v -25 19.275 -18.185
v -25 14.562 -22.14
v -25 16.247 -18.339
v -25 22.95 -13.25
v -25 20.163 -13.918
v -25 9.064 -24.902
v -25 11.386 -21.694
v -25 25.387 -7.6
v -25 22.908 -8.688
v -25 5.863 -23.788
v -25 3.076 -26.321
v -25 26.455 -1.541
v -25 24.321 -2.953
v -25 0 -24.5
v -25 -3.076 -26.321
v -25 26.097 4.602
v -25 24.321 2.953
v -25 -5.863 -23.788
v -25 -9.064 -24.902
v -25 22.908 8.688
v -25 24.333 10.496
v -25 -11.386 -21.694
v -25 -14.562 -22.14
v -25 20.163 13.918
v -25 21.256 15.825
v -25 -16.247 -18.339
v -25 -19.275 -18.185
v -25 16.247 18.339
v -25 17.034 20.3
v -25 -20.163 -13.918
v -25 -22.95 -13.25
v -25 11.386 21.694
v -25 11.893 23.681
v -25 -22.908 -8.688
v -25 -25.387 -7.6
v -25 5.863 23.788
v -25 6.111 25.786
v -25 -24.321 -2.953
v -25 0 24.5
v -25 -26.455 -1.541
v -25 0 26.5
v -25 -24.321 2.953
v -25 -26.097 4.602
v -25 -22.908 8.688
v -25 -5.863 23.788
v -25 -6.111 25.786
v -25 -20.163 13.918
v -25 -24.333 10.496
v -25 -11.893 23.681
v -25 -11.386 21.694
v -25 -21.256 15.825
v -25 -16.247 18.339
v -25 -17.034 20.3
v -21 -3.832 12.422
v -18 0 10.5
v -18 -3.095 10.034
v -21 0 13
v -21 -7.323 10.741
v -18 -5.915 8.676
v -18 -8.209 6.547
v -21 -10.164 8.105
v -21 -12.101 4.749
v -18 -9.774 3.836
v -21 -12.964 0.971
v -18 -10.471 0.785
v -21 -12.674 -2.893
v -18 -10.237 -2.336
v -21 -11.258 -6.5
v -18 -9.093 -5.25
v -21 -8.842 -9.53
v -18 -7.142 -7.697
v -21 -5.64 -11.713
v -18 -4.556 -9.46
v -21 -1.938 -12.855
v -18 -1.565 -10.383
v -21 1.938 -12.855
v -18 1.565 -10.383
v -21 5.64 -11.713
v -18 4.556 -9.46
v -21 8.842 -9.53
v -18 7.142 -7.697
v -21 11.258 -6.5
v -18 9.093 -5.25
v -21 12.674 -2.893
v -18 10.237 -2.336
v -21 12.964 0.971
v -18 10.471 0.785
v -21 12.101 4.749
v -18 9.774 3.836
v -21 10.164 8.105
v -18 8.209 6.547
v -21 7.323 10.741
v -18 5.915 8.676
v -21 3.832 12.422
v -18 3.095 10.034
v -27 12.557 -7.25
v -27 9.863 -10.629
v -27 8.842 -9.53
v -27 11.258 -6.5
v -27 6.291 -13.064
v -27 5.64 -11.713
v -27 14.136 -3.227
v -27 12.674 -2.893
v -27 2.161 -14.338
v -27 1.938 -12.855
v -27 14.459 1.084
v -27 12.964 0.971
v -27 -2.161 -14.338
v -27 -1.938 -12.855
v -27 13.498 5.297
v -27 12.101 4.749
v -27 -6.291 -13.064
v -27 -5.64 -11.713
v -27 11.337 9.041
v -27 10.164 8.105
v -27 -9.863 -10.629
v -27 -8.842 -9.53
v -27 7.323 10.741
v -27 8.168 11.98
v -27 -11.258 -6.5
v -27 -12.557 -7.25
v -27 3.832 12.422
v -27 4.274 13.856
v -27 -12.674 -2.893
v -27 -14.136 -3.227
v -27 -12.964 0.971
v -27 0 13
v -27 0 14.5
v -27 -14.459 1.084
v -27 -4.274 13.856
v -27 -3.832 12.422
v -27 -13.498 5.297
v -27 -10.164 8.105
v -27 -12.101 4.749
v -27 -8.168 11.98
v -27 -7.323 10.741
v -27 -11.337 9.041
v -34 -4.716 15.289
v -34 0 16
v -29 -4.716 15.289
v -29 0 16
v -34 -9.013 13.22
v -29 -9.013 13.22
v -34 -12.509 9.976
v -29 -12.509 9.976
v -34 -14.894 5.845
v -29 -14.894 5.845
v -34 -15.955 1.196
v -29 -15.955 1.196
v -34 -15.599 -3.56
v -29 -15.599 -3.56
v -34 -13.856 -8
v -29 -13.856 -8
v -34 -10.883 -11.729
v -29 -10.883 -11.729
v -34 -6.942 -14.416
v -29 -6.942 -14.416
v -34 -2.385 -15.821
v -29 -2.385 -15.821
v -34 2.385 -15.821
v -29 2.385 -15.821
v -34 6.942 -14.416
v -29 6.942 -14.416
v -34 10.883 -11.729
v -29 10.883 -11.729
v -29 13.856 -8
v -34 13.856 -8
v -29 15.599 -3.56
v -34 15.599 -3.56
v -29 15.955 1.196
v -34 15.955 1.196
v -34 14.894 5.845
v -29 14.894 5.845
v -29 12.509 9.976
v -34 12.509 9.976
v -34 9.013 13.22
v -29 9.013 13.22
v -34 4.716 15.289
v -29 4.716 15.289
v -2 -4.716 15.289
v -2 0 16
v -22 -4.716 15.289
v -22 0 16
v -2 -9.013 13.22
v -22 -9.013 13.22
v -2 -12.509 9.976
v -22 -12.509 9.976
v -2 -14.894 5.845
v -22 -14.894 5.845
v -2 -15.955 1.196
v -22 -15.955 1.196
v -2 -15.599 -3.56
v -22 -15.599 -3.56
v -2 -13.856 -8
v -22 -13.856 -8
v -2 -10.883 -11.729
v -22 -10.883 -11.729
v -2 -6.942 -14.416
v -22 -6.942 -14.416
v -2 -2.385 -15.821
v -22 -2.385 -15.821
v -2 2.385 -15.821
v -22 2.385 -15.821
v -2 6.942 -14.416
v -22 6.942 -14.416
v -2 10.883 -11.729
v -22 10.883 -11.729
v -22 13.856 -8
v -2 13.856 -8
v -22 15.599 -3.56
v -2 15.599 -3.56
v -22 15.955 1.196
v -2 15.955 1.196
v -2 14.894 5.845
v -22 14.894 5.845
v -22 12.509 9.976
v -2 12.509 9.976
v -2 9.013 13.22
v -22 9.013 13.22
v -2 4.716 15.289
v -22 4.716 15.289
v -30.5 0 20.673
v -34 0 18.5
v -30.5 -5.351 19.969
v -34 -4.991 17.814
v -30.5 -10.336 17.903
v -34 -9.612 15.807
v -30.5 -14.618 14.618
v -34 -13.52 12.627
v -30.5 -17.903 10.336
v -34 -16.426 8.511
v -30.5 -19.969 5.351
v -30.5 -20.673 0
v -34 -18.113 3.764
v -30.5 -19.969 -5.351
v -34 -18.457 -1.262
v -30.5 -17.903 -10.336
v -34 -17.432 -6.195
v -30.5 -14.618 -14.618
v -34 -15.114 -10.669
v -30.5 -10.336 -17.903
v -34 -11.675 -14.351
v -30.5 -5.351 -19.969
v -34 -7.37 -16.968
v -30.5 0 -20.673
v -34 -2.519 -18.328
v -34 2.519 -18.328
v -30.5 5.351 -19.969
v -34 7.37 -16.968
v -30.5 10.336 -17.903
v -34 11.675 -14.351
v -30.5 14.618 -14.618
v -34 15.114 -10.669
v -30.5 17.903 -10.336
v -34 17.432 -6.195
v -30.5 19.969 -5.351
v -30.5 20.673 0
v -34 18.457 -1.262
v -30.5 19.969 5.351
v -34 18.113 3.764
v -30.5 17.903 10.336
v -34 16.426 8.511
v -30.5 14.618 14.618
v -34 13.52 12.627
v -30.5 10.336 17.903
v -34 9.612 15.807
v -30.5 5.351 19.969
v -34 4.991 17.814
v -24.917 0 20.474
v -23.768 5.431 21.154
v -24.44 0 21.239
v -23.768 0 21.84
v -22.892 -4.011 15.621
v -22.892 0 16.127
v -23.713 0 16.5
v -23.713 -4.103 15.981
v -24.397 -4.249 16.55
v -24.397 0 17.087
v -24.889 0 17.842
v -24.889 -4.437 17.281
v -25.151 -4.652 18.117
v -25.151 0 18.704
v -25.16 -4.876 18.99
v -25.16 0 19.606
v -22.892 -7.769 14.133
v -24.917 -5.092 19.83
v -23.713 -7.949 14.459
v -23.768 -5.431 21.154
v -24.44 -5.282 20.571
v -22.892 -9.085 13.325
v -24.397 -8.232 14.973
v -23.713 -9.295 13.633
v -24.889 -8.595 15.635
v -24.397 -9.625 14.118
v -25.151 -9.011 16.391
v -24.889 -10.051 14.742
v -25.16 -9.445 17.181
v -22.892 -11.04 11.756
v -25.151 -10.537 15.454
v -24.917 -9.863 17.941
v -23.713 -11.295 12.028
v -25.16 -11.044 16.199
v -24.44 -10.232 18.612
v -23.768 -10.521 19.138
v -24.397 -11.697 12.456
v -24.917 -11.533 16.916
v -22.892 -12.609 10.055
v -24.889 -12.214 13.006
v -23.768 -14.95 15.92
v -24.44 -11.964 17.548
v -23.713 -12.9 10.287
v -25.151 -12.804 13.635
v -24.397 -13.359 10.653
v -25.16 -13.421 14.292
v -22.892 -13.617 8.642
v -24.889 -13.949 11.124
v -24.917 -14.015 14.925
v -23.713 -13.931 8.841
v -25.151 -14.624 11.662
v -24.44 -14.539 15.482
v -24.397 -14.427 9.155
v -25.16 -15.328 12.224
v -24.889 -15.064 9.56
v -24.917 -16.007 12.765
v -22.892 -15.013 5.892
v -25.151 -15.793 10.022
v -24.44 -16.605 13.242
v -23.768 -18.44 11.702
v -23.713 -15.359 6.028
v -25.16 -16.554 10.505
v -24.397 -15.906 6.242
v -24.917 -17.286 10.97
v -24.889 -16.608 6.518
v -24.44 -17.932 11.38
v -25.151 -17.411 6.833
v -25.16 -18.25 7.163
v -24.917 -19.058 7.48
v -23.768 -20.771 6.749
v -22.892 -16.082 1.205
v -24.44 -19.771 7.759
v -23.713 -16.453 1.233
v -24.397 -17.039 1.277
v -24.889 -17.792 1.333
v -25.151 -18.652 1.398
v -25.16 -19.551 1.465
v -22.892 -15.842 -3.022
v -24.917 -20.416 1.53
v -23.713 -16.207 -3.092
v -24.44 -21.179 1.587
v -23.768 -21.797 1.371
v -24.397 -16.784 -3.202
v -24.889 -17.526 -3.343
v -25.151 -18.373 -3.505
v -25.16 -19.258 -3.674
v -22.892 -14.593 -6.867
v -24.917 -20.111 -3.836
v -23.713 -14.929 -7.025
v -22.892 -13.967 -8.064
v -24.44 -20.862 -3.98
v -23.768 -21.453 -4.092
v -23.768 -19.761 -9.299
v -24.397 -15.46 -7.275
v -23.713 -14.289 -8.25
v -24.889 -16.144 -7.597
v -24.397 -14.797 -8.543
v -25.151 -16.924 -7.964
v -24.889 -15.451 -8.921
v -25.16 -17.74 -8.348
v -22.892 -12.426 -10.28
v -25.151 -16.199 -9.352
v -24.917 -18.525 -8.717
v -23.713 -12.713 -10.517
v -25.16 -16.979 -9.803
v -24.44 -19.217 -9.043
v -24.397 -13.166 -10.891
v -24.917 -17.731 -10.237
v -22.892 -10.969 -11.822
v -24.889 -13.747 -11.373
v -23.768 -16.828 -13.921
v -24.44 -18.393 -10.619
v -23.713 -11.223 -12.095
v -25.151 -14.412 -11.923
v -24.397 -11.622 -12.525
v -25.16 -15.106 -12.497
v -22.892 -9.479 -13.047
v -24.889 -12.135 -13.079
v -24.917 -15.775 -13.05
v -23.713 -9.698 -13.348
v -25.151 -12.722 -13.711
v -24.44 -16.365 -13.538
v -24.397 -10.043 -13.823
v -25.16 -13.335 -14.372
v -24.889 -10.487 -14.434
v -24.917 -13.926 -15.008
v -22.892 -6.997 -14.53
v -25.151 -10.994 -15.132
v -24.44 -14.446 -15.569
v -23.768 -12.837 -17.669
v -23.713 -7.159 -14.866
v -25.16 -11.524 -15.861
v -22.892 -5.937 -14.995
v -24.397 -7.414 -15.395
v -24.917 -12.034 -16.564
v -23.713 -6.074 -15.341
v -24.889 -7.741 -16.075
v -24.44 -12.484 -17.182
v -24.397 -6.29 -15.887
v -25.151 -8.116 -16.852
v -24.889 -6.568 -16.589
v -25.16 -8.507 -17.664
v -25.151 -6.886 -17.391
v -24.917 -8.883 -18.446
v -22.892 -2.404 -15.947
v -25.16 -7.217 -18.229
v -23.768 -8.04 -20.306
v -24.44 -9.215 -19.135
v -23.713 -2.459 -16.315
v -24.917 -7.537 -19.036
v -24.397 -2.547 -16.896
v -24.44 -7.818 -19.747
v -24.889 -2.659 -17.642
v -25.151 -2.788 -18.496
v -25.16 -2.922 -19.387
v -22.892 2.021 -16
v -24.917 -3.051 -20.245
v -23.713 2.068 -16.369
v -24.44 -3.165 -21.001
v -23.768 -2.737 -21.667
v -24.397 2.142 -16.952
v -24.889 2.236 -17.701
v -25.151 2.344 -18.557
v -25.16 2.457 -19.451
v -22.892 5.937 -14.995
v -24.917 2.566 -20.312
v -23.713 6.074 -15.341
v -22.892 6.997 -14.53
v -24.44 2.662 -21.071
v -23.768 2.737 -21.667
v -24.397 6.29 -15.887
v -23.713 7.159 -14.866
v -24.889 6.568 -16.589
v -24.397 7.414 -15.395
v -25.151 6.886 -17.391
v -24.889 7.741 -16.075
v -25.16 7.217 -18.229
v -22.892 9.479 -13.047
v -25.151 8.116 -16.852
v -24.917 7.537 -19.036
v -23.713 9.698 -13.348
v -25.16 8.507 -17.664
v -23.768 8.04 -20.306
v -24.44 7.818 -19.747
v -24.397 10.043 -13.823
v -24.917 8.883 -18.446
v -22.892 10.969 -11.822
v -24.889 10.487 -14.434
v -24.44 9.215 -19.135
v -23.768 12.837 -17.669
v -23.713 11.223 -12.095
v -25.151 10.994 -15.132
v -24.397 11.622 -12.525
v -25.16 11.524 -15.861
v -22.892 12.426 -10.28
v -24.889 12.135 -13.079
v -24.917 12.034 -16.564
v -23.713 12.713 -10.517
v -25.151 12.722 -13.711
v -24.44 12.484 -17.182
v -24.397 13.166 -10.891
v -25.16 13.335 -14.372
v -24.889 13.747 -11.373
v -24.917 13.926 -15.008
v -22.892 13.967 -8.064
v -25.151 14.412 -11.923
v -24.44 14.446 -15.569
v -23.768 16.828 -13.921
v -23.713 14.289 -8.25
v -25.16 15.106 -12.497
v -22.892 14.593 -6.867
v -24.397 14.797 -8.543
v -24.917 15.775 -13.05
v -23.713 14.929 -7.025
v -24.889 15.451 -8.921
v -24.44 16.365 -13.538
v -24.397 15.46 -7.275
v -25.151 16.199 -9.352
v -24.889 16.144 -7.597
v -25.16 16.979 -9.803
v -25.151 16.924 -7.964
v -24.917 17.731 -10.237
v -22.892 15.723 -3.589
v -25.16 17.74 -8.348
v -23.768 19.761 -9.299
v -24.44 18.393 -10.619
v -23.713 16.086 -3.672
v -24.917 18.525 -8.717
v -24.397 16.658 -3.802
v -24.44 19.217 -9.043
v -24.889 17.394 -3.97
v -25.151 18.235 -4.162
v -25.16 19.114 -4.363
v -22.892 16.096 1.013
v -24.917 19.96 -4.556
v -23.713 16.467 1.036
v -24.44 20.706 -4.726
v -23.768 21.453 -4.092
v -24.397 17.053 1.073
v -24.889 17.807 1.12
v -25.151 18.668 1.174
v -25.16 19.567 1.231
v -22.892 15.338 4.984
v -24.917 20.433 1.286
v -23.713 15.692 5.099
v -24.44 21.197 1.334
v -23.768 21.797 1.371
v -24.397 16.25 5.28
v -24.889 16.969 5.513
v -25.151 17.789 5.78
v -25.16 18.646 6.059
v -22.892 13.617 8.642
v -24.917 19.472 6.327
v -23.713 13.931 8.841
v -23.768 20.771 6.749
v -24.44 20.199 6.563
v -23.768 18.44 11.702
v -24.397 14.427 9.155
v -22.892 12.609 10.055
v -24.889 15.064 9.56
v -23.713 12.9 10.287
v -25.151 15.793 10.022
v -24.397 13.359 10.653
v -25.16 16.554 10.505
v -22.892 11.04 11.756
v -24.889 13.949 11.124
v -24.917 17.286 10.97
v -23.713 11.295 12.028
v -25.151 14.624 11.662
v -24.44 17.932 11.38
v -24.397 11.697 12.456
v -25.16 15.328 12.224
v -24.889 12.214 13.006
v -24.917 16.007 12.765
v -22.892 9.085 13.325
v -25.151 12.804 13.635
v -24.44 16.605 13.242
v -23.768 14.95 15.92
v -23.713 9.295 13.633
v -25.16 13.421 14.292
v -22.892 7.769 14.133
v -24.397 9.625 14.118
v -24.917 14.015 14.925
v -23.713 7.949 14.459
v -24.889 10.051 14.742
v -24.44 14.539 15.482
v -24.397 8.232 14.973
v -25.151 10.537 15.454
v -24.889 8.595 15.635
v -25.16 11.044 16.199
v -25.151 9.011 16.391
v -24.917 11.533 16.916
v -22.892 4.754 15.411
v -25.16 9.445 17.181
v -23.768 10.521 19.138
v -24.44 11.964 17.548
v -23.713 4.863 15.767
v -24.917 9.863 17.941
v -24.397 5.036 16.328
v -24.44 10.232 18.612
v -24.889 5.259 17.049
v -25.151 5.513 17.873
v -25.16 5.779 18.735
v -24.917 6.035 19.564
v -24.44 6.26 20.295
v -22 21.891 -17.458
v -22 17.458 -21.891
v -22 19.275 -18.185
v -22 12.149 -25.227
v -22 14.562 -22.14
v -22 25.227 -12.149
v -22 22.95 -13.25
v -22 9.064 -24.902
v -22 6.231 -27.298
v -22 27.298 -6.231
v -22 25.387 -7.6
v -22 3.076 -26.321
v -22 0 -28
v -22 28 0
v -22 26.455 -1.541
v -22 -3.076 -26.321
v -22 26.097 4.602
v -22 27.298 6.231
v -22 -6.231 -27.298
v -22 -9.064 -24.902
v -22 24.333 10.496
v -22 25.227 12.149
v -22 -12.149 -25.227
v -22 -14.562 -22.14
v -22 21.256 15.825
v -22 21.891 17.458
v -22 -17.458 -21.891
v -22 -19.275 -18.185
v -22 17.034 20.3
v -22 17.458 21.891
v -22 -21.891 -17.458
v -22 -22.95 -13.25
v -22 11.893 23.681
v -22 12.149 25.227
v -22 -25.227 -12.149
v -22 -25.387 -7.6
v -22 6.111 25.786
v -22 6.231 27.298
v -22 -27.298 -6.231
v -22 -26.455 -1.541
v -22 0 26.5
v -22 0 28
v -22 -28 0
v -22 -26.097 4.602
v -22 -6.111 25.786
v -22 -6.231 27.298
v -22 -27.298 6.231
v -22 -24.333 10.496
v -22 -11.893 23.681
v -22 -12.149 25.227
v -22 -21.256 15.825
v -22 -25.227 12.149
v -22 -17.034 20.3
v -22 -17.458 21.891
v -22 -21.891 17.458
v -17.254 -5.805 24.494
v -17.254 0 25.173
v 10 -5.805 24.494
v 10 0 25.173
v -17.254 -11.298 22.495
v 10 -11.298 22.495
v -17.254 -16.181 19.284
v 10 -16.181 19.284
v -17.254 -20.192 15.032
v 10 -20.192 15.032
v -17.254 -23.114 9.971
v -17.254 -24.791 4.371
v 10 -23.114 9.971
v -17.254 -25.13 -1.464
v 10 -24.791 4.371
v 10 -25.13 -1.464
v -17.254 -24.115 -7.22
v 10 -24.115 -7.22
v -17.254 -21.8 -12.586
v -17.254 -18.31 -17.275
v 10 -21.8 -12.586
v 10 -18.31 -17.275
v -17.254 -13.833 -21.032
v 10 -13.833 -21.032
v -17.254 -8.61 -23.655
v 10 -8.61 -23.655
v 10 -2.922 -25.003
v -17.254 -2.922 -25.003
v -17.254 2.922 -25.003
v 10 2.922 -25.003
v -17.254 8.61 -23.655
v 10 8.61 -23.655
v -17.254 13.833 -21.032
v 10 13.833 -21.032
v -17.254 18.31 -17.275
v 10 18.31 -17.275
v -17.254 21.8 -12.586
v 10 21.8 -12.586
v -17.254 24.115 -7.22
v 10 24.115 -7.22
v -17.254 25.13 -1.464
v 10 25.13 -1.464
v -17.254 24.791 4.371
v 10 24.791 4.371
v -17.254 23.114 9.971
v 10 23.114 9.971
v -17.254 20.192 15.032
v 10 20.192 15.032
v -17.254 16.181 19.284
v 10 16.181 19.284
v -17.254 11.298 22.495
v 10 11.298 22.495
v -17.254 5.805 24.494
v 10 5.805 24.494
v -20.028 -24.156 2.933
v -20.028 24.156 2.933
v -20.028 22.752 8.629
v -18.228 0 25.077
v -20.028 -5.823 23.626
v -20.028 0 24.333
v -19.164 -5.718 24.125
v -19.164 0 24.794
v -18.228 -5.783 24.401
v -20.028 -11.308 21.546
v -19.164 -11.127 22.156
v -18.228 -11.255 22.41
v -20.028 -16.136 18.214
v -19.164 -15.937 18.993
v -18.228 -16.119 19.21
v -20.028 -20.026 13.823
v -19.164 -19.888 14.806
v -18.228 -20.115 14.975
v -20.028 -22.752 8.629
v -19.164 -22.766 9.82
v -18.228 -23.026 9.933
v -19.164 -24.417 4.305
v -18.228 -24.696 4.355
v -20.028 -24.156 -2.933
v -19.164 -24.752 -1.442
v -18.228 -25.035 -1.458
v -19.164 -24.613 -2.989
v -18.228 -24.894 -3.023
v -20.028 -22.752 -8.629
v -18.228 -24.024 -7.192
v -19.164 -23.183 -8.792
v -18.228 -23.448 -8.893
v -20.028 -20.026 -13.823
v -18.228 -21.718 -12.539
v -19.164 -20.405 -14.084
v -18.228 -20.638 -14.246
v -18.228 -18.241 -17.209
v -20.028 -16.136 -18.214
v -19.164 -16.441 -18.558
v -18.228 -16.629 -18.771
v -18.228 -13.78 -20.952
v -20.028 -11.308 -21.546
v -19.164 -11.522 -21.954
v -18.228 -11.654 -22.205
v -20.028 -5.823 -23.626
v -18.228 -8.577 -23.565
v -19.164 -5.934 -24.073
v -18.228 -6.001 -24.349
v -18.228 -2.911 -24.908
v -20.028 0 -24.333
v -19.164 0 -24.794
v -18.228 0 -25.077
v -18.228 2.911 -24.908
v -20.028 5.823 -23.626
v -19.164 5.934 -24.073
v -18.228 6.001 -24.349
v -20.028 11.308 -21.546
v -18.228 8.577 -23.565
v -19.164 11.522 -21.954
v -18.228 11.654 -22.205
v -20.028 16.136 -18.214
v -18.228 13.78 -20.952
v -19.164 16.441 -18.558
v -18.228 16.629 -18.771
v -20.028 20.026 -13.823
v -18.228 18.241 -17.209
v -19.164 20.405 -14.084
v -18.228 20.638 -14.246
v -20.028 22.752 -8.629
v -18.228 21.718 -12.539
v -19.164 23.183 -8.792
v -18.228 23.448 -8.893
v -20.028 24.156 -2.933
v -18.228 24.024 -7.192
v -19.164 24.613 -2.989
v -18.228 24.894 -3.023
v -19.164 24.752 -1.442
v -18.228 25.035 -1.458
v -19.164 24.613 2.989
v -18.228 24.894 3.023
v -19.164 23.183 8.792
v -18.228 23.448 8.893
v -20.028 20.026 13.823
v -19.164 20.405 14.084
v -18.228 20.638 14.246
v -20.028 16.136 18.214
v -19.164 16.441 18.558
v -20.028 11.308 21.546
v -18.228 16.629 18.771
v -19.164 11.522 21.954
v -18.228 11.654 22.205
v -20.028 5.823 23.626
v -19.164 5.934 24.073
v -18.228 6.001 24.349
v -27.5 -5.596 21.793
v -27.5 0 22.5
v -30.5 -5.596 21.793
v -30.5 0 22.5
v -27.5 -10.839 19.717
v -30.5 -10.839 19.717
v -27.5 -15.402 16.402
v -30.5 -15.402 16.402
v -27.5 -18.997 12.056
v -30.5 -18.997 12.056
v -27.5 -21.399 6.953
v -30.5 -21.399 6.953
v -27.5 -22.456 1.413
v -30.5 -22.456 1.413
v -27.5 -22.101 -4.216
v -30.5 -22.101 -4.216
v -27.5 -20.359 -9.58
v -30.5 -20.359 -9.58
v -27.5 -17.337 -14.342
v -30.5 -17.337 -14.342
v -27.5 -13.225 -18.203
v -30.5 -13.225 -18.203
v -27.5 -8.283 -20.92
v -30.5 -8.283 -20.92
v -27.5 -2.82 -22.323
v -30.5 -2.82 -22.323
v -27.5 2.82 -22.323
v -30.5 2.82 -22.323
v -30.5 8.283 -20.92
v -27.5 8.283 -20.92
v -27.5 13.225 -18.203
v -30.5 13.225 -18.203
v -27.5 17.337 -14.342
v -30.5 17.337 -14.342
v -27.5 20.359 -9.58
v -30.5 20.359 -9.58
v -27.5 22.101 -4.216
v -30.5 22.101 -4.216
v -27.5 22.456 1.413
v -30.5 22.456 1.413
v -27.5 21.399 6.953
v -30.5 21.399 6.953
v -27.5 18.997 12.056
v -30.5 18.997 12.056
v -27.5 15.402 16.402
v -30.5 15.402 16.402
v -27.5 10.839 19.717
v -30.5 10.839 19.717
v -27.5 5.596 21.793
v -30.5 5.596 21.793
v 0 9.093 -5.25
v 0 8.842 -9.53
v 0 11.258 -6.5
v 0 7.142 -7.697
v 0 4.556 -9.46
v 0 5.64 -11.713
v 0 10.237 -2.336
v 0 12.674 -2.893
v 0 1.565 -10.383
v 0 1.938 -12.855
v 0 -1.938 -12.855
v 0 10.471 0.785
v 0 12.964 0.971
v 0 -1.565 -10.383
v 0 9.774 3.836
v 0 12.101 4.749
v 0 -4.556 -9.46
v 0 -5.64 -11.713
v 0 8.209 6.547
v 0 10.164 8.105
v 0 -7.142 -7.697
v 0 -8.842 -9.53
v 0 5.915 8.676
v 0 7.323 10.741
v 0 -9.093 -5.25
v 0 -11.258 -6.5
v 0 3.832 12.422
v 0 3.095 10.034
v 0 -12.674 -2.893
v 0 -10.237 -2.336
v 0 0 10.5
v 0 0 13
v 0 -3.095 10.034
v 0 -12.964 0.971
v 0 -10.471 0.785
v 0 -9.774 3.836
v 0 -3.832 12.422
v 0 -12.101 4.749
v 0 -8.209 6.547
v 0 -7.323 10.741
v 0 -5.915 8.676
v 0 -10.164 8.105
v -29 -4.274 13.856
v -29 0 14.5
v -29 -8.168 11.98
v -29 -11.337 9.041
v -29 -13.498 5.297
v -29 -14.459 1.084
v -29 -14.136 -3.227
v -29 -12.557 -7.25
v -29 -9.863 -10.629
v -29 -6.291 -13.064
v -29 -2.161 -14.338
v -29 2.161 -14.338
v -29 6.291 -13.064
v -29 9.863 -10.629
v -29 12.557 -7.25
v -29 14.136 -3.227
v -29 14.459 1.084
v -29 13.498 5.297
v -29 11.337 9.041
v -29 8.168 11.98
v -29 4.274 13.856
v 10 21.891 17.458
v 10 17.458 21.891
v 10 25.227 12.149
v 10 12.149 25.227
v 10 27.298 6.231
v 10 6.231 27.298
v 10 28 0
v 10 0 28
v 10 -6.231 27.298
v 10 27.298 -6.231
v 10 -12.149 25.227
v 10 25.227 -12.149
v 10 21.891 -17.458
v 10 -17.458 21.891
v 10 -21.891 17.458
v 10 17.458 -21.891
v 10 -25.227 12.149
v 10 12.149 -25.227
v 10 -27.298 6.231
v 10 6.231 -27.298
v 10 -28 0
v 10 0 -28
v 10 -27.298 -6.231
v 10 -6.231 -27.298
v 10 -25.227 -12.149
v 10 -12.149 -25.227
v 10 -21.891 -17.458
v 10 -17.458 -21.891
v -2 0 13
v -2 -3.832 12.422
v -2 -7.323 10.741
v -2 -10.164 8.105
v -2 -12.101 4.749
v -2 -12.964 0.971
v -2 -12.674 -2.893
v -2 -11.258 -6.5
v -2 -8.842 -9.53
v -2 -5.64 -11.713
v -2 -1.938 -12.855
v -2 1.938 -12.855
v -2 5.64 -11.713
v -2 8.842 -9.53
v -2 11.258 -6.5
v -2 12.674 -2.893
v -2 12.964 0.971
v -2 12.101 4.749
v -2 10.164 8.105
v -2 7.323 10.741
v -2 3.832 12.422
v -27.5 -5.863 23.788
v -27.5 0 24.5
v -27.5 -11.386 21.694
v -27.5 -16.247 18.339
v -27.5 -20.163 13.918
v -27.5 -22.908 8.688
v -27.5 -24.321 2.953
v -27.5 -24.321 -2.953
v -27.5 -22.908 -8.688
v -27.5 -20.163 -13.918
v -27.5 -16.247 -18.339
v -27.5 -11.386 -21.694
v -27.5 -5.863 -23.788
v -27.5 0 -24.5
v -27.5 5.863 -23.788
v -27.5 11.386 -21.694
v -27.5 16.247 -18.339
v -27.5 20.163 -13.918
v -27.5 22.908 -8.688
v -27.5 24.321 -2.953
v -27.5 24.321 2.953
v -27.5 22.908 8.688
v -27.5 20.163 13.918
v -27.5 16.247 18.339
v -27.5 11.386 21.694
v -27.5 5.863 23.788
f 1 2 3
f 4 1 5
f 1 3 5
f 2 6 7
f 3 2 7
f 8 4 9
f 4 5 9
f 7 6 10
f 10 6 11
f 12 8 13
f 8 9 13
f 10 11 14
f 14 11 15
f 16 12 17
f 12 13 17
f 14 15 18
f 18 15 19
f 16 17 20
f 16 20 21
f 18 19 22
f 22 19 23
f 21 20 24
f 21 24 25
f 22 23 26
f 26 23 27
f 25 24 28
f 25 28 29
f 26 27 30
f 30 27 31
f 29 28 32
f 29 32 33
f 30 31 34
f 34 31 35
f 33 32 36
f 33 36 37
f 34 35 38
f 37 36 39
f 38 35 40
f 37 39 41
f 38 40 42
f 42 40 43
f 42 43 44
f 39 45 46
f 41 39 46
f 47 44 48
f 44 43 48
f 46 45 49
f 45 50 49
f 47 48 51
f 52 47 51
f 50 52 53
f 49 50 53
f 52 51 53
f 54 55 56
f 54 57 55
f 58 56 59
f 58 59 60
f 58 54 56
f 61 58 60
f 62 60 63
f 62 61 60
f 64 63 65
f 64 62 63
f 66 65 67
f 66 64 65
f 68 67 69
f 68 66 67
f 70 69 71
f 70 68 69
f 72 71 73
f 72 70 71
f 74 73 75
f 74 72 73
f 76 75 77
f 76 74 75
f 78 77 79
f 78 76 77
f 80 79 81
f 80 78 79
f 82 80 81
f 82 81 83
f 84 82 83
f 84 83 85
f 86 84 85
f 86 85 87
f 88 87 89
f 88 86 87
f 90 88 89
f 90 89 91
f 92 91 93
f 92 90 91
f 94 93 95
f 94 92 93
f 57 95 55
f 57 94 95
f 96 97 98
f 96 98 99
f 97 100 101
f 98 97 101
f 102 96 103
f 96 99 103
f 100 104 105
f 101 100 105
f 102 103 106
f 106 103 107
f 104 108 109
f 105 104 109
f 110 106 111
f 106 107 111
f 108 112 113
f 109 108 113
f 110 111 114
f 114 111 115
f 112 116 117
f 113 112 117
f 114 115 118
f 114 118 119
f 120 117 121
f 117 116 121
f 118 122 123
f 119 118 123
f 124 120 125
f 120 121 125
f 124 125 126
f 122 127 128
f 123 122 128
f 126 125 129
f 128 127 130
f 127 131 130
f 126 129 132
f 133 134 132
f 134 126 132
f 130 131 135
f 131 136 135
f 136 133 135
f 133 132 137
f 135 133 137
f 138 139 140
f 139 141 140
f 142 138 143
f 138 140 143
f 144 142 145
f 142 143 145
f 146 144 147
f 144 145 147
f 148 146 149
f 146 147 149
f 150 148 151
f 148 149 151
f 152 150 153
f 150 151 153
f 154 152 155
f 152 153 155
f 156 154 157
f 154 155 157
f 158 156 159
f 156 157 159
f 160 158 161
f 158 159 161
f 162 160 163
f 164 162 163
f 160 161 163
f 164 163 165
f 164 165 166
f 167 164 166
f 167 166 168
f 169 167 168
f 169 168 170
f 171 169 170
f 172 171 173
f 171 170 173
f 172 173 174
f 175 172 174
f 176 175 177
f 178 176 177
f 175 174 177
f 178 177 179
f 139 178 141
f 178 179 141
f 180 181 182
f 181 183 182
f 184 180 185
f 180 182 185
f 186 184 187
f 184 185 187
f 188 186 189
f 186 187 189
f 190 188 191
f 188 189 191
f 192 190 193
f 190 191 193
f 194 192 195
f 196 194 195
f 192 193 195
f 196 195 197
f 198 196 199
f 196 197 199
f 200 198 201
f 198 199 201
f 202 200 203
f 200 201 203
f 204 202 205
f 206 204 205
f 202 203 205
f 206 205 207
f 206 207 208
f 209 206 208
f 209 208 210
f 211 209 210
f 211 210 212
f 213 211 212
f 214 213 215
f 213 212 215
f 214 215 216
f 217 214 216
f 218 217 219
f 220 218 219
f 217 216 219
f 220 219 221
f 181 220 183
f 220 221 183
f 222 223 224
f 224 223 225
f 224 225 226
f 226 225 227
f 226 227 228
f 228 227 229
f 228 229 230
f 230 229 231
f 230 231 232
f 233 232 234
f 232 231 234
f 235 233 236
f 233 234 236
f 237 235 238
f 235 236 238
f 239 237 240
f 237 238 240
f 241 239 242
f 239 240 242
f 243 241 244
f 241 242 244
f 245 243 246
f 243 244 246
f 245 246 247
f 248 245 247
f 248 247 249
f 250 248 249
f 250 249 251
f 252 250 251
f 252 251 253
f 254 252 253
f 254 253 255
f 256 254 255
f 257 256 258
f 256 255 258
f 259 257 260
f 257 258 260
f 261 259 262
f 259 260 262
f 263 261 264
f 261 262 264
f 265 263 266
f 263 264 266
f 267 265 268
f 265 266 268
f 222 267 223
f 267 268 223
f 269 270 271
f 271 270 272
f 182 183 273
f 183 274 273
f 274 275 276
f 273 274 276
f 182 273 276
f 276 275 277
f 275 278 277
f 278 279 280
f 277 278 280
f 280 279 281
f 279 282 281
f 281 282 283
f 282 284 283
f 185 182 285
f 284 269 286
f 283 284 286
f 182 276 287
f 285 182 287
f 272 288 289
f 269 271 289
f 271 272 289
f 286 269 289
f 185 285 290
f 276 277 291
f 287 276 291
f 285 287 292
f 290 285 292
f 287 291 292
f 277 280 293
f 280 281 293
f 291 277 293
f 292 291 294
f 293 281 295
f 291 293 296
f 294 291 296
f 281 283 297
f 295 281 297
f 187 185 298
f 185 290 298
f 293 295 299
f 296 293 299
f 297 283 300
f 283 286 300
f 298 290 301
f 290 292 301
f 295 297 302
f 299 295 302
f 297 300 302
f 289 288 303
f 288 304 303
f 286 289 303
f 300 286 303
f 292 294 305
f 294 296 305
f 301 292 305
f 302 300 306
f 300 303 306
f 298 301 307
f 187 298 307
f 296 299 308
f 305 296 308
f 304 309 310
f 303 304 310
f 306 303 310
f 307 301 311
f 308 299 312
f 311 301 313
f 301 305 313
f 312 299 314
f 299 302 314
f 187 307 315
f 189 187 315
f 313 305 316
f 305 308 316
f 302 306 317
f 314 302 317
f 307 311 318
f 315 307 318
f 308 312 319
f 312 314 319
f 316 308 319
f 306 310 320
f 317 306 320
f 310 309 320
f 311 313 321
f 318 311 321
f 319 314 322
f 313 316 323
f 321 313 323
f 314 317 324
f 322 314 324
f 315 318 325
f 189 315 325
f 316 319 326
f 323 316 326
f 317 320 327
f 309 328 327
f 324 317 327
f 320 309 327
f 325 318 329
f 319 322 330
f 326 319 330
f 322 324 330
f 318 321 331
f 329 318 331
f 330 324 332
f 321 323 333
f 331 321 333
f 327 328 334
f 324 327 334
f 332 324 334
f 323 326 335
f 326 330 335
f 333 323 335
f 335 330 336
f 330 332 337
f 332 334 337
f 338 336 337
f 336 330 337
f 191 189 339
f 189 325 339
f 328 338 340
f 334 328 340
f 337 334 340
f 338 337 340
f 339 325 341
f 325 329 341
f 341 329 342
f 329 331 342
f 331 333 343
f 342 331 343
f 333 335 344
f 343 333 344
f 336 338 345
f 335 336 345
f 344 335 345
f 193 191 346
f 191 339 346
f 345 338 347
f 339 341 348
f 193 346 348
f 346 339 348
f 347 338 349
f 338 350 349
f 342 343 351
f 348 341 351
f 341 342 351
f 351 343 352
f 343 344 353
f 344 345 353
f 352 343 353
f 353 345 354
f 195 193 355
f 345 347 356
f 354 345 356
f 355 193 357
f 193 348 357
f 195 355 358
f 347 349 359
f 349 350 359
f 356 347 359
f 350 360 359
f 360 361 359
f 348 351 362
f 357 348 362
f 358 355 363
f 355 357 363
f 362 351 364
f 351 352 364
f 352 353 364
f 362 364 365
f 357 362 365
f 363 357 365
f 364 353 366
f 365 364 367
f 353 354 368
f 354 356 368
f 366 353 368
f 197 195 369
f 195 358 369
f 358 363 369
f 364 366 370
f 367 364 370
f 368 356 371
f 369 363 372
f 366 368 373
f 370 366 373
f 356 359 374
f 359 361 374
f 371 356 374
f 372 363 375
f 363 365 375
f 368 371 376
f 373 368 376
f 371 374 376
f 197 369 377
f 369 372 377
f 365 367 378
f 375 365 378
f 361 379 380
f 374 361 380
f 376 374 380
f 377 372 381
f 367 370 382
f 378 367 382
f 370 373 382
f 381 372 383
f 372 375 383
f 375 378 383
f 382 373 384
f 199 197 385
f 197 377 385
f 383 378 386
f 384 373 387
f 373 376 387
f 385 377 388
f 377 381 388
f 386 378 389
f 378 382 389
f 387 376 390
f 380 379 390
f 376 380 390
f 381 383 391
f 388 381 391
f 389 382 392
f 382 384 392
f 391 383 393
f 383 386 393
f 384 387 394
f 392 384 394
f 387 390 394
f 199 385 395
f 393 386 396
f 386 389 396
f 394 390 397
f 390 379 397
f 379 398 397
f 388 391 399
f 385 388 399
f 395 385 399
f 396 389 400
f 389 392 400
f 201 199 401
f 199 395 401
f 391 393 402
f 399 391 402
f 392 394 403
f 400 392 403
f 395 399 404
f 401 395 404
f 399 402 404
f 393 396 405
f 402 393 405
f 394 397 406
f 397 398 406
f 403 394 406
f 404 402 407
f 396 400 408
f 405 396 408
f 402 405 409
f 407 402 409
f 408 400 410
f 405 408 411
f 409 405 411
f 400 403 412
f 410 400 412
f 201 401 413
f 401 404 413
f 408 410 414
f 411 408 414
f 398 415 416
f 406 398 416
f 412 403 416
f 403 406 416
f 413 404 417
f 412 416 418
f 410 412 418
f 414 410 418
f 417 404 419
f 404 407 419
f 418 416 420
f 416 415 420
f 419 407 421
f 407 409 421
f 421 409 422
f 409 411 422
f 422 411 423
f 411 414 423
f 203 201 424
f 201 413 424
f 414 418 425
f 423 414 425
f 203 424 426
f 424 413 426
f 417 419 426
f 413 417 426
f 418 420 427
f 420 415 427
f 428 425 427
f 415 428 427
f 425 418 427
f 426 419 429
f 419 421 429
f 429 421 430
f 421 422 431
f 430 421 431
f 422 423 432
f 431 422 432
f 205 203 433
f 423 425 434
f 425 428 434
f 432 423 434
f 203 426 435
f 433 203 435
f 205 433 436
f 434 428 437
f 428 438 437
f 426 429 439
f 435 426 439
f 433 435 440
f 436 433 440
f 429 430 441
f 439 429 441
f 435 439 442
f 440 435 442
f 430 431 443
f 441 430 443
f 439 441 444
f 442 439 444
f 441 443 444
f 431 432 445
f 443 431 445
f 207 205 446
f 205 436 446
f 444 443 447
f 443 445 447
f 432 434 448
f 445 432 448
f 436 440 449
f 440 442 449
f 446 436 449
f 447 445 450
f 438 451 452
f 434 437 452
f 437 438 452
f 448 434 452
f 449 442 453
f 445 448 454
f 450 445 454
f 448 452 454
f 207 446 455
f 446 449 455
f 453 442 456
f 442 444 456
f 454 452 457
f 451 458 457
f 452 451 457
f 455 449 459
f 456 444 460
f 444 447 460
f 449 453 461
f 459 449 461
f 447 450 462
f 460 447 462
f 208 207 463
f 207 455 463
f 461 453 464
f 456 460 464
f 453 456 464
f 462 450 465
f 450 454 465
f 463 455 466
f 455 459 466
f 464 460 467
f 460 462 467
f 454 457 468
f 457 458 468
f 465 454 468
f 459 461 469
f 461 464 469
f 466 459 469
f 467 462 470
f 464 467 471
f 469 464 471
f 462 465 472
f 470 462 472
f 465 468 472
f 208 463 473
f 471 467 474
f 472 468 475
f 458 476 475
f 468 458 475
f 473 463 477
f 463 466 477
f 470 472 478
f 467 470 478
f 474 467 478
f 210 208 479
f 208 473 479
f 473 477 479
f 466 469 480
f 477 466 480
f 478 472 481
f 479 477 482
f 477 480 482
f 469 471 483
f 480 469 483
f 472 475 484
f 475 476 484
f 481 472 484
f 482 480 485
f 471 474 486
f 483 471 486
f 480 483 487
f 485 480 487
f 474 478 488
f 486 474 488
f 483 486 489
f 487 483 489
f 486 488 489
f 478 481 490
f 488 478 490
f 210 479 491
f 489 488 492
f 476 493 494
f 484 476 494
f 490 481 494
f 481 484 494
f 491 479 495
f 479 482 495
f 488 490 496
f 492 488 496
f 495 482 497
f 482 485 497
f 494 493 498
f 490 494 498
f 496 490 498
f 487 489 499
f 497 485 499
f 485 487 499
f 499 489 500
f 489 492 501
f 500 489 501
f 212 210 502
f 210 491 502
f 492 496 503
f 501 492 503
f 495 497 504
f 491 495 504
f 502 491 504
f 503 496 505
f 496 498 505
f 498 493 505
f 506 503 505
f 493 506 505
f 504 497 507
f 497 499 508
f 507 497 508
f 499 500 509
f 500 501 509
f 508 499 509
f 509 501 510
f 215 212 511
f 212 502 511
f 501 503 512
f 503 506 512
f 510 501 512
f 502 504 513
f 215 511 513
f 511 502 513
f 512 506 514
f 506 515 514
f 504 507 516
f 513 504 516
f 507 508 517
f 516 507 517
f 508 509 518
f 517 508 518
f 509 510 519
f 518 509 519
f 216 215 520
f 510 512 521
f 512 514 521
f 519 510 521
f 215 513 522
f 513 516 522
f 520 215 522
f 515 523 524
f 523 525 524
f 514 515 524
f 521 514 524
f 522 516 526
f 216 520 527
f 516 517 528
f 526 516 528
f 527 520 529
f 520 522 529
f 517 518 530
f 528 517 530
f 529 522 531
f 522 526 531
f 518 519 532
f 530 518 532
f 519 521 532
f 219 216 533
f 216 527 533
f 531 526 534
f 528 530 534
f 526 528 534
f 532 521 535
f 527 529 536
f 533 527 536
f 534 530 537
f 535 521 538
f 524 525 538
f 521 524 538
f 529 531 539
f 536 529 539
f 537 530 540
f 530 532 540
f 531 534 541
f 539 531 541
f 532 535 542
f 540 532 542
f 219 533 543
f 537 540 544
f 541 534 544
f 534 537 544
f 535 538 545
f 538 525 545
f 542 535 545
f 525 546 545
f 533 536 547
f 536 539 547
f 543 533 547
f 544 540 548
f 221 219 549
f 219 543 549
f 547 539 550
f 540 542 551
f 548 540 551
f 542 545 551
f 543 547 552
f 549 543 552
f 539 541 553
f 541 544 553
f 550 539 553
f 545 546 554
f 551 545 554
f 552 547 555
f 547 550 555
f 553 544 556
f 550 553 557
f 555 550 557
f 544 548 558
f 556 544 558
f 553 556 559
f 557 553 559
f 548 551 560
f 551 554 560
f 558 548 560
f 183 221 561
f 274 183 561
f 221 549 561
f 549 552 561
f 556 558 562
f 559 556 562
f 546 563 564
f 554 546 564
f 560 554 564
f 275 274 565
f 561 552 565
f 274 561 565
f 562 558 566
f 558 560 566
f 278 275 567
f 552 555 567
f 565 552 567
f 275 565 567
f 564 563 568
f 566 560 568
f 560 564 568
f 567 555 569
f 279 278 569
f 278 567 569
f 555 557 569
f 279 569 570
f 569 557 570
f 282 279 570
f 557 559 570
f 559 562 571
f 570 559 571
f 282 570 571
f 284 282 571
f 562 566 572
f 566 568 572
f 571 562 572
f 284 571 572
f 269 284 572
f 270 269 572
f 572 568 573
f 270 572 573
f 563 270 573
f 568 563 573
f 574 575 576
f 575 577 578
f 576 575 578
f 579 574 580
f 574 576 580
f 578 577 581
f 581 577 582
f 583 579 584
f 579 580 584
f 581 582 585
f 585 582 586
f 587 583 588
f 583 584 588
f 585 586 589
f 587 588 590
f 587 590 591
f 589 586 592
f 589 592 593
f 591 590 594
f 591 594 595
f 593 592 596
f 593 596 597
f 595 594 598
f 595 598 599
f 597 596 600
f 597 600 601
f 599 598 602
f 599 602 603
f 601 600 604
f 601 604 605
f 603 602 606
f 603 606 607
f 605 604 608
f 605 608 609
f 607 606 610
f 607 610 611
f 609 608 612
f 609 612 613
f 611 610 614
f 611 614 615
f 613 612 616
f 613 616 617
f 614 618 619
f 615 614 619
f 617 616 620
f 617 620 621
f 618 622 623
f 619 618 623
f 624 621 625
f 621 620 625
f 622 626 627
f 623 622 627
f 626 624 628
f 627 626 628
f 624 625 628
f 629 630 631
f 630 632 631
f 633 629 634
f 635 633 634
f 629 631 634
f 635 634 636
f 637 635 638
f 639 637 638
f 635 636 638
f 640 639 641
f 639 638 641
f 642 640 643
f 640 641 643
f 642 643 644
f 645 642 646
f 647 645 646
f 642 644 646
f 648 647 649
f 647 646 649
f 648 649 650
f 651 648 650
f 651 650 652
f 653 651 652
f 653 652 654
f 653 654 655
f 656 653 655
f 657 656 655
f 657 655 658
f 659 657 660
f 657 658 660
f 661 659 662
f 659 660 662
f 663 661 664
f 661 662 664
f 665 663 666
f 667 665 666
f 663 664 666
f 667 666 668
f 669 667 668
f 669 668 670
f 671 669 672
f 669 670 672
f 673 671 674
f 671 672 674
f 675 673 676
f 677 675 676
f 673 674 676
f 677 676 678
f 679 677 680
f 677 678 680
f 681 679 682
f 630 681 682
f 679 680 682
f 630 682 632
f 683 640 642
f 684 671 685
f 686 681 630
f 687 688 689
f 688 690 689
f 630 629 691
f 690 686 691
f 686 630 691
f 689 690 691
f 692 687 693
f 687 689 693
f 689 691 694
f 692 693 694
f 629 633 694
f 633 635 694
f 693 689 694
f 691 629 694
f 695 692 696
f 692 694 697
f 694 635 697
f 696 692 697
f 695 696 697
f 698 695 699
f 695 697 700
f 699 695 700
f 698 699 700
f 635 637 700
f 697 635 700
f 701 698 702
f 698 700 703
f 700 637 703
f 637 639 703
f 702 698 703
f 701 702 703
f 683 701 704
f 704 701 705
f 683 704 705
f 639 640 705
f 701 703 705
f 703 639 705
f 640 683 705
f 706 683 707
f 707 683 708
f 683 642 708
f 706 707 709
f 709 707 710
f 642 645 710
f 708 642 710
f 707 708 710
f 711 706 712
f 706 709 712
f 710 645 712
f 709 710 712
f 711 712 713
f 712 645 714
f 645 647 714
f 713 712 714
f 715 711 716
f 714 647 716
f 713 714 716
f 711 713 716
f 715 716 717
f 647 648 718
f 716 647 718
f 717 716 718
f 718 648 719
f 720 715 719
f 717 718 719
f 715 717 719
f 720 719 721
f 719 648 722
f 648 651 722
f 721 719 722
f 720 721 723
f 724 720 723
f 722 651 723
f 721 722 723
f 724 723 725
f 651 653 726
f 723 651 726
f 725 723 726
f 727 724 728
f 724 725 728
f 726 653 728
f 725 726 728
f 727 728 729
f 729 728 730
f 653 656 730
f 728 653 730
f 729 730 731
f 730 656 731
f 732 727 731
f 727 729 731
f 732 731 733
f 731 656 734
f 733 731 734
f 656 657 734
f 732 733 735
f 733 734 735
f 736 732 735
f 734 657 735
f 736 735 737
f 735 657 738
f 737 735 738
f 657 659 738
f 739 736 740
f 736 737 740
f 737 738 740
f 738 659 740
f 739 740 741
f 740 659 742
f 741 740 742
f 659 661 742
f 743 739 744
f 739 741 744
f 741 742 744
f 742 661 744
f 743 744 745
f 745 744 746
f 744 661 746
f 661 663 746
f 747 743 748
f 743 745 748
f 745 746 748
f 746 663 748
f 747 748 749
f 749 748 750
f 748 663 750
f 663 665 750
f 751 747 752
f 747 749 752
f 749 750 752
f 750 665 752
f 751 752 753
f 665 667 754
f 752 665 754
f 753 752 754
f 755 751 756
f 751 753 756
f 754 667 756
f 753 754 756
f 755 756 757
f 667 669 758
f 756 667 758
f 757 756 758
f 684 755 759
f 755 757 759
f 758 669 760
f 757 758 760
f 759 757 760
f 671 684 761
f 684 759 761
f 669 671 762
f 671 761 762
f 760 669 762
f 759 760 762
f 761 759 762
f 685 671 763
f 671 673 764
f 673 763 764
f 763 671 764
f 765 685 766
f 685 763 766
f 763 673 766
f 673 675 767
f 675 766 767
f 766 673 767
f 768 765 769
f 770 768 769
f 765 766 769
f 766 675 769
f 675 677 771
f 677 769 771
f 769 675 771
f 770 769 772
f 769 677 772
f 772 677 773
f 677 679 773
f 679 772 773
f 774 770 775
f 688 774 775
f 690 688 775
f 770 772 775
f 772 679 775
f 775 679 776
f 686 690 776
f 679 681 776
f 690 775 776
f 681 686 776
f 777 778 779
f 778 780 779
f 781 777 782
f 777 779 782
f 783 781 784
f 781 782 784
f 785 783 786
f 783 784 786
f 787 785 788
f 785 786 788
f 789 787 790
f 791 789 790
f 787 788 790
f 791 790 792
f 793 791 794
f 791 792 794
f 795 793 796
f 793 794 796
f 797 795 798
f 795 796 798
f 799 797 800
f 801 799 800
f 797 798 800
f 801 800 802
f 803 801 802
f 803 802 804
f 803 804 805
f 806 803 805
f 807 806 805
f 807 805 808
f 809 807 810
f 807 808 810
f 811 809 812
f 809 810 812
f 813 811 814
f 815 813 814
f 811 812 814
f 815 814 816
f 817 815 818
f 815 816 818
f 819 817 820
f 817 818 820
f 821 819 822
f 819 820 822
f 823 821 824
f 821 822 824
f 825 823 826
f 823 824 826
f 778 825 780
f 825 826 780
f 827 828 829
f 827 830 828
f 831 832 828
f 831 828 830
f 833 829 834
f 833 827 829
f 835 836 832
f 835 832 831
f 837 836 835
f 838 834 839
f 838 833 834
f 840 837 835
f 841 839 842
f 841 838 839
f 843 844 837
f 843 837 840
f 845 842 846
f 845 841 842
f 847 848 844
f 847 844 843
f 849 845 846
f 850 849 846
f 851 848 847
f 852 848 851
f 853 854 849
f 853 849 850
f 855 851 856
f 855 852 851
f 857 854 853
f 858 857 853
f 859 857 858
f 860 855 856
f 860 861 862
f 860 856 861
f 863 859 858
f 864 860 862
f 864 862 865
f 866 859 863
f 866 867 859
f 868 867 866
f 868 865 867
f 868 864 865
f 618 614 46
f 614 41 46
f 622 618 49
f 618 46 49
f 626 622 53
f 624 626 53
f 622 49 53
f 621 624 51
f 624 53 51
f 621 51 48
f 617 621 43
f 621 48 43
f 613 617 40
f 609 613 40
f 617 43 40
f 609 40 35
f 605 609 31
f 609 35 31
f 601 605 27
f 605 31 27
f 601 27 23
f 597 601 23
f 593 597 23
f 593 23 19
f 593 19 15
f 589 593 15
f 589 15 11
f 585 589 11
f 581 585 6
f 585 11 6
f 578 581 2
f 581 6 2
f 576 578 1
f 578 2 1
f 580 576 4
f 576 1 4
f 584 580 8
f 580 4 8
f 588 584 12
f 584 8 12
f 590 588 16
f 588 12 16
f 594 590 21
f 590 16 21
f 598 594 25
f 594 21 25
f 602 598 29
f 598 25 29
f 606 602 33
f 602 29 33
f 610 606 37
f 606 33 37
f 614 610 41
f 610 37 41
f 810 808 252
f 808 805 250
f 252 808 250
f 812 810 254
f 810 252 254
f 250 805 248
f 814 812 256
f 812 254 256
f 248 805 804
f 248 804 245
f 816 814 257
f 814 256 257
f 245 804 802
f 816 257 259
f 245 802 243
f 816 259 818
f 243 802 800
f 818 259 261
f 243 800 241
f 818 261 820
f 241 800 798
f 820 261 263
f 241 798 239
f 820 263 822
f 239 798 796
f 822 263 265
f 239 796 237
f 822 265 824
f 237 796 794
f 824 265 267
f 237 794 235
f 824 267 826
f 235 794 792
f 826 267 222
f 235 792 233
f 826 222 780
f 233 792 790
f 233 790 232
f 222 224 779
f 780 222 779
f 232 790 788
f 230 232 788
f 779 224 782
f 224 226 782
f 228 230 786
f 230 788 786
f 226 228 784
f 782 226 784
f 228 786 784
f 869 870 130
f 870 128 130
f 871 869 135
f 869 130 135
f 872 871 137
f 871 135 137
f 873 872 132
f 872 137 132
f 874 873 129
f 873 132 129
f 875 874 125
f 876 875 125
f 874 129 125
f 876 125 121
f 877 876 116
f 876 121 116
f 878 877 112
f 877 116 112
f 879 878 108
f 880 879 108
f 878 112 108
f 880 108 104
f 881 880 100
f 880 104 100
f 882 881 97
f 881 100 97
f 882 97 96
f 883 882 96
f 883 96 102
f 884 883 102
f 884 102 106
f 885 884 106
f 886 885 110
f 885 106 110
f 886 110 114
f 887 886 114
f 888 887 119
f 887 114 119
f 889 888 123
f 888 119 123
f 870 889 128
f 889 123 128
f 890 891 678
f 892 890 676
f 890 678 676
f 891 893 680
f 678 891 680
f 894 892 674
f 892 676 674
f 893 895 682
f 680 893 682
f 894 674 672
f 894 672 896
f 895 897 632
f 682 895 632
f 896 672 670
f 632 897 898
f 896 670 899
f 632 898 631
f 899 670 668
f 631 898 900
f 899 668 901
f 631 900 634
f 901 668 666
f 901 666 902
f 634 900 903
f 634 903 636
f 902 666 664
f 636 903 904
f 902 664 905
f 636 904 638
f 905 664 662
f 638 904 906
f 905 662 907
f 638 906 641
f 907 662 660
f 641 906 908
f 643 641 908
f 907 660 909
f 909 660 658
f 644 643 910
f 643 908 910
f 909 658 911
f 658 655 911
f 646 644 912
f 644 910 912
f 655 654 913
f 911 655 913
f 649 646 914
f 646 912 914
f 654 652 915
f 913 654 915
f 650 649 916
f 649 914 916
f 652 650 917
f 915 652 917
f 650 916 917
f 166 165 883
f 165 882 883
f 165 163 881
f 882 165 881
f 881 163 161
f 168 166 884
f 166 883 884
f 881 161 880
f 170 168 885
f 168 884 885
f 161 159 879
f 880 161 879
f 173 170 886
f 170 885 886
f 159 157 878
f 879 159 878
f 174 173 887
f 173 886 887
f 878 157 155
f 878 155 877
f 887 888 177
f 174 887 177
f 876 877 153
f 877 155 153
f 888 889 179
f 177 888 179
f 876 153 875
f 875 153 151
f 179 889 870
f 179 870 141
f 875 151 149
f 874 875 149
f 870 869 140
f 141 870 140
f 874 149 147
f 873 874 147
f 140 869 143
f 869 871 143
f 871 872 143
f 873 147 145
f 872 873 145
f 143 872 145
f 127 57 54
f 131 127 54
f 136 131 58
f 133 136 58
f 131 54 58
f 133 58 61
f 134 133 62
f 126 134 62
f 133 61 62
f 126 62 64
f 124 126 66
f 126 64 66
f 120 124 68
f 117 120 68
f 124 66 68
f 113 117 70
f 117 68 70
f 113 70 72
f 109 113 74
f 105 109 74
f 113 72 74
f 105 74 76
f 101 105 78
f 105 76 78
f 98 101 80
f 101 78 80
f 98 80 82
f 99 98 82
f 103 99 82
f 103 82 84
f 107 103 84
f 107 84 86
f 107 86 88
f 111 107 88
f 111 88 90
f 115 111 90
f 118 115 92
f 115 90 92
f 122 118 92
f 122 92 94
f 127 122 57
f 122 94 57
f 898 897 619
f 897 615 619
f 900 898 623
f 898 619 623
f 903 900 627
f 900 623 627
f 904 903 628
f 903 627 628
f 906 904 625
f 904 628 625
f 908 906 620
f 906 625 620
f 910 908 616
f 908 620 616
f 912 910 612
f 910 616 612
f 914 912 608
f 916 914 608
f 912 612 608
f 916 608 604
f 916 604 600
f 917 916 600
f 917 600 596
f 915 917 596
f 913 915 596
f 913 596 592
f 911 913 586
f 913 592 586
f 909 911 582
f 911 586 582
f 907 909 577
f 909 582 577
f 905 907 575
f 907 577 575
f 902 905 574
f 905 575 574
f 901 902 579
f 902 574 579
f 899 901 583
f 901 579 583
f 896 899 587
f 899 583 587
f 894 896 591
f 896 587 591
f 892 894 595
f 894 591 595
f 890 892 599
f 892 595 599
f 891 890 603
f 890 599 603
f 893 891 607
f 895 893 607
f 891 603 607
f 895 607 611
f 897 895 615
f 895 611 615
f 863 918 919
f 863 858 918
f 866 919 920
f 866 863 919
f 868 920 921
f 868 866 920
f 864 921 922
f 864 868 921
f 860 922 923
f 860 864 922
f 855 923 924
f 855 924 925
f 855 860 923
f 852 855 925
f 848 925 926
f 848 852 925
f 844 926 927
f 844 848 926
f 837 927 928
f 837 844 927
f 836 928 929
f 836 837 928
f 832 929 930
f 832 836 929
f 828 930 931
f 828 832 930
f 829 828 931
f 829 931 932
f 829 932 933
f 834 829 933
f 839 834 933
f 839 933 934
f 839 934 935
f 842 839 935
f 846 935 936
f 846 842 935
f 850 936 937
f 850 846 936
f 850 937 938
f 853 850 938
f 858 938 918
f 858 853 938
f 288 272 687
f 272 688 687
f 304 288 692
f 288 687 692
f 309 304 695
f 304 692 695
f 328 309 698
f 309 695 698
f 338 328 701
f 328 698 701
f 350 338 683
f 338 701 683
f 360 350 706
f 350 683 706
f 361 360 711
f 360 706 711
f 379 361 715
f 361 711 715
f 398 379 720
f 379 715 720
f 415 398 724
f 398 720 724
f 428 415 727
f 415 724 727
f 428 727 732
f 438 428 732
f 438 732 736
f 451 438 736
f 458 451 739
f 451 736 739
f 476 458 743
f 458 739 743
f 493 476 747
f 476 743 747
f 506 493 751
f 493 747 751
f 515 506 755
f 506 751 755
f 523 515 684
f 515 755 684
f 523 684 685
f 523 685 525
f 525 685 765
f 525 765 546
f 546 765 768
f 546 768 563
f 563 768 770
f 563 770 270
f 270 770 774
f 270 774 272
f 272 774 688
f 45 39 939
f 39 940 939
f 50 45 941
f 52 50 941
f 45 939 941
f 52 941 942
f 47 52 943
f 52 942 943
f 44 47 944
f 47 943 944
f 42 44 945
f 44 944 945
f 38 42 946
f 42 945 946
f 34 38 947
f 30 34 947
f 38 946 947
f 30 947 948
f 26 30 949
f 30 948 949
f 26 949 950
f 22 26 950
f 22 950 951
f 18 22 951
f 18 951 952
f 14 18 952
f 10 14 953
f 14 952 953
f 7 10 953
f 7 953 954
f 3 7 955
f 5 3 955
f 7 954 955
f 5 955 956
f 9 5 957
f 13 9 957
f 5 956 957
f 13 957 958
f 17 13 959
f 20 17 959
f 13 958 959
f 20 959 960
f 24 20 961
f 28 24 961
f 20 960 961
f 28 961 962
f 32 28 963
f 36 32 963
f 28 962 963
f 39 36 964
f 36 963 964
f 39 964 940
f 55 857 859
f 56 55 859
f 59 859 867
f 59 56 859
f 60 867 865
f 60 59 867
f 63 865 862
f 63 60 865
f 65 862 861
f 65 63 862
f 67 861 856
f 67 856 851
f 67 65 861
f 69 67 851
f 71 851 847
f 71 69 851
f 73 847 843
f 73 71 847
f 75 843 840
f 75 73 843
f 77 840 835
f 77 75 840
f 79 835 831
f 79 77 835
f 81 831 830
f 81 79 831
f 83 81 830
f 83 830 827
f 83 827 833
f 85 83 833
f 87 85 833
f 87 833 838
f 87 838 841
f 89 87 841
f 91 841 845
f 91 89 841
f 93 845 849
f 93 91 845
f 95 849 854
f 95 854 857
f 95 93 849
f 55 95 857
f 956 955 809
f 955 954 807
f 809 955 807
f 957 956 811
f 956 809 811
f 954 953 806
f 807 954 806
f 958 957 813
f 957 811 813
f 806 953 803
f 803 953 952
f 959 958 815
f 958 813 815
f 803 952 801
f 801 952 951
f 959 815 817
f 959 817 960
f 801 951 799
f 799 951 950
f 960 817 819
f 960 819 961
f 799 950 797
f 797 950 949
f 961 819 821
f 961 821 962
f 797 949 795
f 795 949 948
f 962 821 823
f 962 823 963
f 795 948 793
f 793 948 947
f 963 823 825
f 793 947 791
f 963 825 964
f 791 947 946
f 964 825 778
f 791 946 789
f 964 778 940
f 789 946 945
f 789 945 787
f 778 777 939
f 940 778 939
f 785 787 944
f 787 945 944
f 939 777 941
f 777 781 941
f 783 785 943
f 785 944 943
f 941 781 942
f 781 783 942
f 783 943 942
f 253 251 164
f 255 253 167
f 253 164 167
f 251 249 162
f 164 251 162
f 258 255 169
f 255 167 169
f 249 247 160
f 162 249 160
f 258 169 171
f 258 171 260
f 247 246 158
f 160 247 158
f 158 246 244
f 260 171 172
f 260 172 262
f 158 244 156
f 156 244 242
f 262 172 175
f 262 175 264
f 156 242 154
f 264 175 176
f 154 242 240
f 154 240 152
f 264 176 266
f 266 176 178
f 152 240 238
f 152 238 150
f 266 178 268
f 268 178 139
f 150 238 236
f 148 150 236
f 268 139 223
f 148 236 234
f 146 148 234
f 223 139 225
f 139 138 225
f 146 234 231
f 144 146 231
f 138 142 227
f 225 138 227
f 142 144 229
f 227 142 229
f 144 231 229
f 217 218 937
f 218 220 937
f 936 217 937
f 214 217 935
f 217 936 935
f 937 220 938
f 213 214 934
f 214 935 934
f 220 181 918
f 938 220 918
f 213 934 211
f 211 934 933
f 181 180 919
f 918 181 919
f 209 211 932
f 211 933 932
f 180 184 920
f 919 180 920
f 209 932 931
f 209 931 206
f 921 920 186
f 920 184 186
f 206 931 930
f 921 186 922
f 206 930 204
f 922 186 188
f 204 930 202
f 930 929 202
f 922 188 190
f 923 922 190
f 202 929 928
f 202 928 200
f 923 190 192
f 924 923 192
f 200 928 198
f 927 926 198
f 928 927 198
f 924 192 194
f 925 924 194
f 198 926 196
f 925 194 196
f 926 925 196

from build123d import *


with BuildPart() as part:
    # Esquisse1 → Révolution1 (revolve)
    with BuildSketch(Plane.XY):
        Polygon((0, 10.5), (-18, 10.5), (-21, 13), (0, 13), align=None)
    revolve(axis=Axis((-90.5, 0, 0), (1, 0, 0)))

    # Esquisse2 → Révolution4 (revolve)
    with BuildSketch(Plane.XY):
        with BuildLine():
            Line((-2, 13), (-2, 16))
            Line((-2, 16), (-22, 16))
            ThreePointArc((-22, 16), (-25.050730834, 18.263813026), (-23.768106875, 21.839660313))
            Line((-23.768106875, 21.839660313), (-20.027737076, 24.33324018))
            ThreePointArc((-20.027737076, 24.33324018), (-18.703156838, 24.95844884), (-17.254236095, 25.172988708))
            Line((-17.254236095, 25.172988708), (10, 25.172988708))
            Line((10, 25.172988708), (10, 28))
            Line((10, 28), (-22, 28))
            Line((-22, 28), (-22, 26.5))
            Line((-22, 26.5), (-25, 26.5))
            Line((-25, 26.5), (-25, 24.5))
            Line((-25, 24.5), (-27.5, 24.5))
            Line((-27.5, 24.5), (-27.5, 22.5))
            Line((-27.5, 22.5), (-30.5, 22.5))
            Line((-30.5, 22.5), (-30.5, 20.672988708))
            Line((-30.5, 20.672988708), (-34, 18.5))
            Line((-34, 18.5), (-34, 16))
            Line((-34, 16), (-29, 16))
            Line((-29, 16), (-29, 14.5))
            Line((-29, 14.5), (-27, 14.5))
            Line((-27, 14.5), (-27, 13))
            Line((-27, 13), (-2, 13))
        make_face()
    revolve(axis=Axis((-35.5, 0, 0), (1, 0, 0)))


solid = part.part
